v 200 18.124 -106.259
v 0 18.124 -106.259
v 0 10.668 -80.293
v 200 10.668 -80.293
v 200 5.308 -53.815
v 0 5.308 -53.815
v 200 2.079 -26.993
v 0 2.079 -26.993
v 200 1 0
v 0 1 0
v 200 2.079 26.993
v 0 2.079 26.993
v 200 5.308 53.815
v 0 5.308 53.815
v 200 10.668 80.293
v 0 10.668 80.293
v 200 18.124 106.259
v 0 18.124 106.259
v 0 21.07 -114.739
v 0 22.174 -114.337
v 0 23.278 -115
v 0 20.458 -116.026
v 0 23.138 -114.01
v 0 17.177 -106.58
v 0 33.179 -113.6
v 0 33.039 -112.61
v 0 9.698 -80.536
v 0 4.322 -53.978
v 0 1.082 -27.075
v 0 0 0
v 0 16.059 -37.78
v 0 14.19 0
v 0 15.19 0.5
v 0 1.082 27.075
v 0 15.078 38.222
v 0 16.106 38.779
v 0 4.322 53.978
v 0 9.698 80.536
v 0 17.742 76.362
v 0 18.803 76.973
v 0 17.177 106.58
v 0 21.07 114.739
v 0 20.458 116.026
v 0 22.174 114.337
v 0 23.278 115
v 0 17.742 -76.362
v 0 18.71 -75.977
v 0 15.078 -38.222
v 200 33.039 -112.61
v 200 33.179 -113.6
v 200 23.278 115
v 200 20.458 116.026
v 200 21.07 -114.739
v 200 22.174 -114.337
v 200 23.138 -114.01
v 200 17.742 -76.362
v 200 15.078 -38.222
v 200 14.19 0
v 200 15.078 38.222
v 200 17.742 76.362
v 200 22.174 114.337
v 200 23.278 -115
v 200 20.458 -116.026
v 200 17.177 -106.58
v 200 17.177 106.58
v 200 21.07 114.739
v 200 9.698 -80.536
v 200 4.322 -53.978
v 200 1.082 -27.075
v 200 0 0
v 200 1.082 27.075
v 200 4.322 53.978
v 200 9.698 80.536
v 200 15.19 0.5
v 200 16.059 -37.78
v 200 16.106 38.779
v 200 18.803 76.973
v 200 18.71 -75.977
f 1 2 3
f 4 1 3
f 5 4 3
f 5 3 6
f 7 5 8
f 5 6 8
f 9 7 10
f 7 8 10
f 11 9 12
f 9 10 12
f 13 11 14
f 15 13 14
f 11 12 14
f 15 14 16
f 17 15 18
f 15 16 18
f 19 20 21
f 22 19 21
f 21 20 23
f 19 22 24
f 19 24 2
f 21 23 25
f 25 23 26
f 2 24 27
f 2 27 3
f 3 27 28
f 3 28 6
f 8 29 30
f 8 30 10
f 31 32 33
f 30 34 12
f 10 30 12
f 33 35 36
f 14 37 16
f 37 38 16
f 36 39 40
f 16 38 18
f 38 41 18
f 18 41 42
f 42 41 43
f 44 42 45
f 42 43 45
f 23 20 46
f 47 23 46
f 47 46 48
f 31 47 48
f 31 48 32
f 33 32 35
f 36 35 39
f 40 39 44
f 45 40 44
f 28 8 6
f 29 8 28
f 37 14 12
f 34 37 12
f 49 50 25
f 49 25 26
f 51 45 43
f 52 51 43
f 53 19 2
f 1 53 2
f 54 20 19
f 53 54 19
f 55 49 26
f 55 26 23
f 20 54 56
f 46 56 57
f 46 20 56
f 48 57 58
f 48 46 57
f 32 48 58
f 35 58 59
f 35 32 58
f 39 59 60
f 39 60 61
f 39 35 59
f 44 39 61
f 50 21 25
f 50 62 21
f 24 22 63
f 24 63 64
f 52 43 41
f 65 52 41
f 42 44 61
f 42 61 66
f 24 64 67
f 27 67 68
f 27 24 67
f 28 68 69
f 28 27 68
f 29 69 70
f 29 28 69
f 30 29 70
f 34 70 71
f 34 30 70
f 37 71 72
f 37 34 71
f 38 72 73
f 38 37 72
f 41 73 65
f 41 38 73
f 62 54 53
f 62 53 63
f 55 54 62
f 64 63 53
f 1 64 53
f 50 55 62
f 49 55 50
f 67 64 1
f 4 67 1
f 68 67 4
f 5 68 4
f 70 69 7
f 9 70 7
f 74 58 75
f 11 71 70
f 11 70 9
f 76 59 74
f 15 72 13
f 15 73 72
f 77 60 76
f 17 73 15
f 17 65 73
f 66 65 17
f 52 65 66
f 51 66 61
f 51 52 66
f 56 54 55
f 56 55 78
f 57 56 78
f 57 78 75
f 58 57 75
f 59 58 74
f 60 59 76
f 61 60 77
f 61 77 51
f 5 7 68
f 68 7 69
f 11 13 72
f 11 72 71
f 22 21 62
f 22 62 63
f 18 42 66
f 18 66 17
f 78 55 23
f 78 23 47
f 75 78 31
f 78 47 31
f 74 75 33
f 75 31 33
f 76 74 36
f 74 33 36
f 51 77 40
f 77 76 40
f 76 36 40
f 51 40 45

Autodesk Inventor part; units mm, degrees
ref_plane "YZ Plane" through (0, 0, 0) normal (1, 0, 0) x (0, 1, 0)
ref_plane "XZ Plane" through (0, 0, 0) normal (0, 1, 0) x (-1, 0, 0)
ref_plane "XY Plane" through (0, 0, 0) normal (0, 0, 1) x (1, 0, 0)
sketch "スケッチ1" plane through (0, 0, 0) normal (1, 0, 0) x (0, 1, 0)
  arc A0 (20.4585, 116.0261) -> (20.4585, -116.0261) centre (339.2375, 0) ccw
  line L0 (23.2776, 115) -> (20.4585, 116.0261)
  line L1 (23.2776, -115) -> (20.4585, -116.0261)
  line L2 (0, -162.4365) -> (0, 162.4365) projected
  arc A1 (23.2776, 115) -> (23.2776, -115) centre (836.8483, 0) ccw
  point P0 (0, 0)
  point P1 (0, 0)
  dimension "d0" = 3
  dimension "d1" = 230
  dimension "d2" = 40
  dimension "d12" = 3
extrude "押し出し1" add sketch "スケッチ1" along normal blind 200
sketch "スケッチ2" plane through (0, 0, 0) normal (-1, 0, 0) x (0, 0, 1)
  line L0 (-116.0261, 20.4585) -> (-106.5797, 17.1772)
  arc A0 (-116.0261, 20.4585) -> (116.0261, 20.4585) centre (0, 339.2375) ccw projected
  line L1 (0, 0) -> (0, -168.7214)
  line L2 (116.0261, 20.4585) -> (106.5797, 17.1772)
  arc A1 (-116.0261, 20.4585) -> (116.0261, 20.4585) centre (0, 339.2375) ccw
  point P0 (-116.0261, 20.4585)
  dimension "d13" = 10
extrude "押し出し2" cut sketch "スケッチ2" against normal through all
shell "シェル1" thickness 1 removed faces 2 at (0, 10.498, -16.8297) at (200, 10.498, -16.8297)
sketch "スケッチ6" plane through (200, 0, 0) normal (1, 0, 0) x (0, 0, -1)
  arc A0 (-115, 23.2776) -> (115, 23.2776) centre (0, 836.8483) ccw projected
  line L0 (115, 23.2776) -> (113.6004, 33.1792)
  line L1 (113.6004, 33.1792) -> (112.6102, 33.0392)
  line L2 (112.6102, 33.0392) -> (114.0098, 23.1382)
  point P0 (0, 0)
  dimension "d18" = 1
  dimension "d19" = 10
extrude "押し出し5" add sketch "スケッチ6" against normal blind 200
properties part number "element_gurnee" material "CFRP"
